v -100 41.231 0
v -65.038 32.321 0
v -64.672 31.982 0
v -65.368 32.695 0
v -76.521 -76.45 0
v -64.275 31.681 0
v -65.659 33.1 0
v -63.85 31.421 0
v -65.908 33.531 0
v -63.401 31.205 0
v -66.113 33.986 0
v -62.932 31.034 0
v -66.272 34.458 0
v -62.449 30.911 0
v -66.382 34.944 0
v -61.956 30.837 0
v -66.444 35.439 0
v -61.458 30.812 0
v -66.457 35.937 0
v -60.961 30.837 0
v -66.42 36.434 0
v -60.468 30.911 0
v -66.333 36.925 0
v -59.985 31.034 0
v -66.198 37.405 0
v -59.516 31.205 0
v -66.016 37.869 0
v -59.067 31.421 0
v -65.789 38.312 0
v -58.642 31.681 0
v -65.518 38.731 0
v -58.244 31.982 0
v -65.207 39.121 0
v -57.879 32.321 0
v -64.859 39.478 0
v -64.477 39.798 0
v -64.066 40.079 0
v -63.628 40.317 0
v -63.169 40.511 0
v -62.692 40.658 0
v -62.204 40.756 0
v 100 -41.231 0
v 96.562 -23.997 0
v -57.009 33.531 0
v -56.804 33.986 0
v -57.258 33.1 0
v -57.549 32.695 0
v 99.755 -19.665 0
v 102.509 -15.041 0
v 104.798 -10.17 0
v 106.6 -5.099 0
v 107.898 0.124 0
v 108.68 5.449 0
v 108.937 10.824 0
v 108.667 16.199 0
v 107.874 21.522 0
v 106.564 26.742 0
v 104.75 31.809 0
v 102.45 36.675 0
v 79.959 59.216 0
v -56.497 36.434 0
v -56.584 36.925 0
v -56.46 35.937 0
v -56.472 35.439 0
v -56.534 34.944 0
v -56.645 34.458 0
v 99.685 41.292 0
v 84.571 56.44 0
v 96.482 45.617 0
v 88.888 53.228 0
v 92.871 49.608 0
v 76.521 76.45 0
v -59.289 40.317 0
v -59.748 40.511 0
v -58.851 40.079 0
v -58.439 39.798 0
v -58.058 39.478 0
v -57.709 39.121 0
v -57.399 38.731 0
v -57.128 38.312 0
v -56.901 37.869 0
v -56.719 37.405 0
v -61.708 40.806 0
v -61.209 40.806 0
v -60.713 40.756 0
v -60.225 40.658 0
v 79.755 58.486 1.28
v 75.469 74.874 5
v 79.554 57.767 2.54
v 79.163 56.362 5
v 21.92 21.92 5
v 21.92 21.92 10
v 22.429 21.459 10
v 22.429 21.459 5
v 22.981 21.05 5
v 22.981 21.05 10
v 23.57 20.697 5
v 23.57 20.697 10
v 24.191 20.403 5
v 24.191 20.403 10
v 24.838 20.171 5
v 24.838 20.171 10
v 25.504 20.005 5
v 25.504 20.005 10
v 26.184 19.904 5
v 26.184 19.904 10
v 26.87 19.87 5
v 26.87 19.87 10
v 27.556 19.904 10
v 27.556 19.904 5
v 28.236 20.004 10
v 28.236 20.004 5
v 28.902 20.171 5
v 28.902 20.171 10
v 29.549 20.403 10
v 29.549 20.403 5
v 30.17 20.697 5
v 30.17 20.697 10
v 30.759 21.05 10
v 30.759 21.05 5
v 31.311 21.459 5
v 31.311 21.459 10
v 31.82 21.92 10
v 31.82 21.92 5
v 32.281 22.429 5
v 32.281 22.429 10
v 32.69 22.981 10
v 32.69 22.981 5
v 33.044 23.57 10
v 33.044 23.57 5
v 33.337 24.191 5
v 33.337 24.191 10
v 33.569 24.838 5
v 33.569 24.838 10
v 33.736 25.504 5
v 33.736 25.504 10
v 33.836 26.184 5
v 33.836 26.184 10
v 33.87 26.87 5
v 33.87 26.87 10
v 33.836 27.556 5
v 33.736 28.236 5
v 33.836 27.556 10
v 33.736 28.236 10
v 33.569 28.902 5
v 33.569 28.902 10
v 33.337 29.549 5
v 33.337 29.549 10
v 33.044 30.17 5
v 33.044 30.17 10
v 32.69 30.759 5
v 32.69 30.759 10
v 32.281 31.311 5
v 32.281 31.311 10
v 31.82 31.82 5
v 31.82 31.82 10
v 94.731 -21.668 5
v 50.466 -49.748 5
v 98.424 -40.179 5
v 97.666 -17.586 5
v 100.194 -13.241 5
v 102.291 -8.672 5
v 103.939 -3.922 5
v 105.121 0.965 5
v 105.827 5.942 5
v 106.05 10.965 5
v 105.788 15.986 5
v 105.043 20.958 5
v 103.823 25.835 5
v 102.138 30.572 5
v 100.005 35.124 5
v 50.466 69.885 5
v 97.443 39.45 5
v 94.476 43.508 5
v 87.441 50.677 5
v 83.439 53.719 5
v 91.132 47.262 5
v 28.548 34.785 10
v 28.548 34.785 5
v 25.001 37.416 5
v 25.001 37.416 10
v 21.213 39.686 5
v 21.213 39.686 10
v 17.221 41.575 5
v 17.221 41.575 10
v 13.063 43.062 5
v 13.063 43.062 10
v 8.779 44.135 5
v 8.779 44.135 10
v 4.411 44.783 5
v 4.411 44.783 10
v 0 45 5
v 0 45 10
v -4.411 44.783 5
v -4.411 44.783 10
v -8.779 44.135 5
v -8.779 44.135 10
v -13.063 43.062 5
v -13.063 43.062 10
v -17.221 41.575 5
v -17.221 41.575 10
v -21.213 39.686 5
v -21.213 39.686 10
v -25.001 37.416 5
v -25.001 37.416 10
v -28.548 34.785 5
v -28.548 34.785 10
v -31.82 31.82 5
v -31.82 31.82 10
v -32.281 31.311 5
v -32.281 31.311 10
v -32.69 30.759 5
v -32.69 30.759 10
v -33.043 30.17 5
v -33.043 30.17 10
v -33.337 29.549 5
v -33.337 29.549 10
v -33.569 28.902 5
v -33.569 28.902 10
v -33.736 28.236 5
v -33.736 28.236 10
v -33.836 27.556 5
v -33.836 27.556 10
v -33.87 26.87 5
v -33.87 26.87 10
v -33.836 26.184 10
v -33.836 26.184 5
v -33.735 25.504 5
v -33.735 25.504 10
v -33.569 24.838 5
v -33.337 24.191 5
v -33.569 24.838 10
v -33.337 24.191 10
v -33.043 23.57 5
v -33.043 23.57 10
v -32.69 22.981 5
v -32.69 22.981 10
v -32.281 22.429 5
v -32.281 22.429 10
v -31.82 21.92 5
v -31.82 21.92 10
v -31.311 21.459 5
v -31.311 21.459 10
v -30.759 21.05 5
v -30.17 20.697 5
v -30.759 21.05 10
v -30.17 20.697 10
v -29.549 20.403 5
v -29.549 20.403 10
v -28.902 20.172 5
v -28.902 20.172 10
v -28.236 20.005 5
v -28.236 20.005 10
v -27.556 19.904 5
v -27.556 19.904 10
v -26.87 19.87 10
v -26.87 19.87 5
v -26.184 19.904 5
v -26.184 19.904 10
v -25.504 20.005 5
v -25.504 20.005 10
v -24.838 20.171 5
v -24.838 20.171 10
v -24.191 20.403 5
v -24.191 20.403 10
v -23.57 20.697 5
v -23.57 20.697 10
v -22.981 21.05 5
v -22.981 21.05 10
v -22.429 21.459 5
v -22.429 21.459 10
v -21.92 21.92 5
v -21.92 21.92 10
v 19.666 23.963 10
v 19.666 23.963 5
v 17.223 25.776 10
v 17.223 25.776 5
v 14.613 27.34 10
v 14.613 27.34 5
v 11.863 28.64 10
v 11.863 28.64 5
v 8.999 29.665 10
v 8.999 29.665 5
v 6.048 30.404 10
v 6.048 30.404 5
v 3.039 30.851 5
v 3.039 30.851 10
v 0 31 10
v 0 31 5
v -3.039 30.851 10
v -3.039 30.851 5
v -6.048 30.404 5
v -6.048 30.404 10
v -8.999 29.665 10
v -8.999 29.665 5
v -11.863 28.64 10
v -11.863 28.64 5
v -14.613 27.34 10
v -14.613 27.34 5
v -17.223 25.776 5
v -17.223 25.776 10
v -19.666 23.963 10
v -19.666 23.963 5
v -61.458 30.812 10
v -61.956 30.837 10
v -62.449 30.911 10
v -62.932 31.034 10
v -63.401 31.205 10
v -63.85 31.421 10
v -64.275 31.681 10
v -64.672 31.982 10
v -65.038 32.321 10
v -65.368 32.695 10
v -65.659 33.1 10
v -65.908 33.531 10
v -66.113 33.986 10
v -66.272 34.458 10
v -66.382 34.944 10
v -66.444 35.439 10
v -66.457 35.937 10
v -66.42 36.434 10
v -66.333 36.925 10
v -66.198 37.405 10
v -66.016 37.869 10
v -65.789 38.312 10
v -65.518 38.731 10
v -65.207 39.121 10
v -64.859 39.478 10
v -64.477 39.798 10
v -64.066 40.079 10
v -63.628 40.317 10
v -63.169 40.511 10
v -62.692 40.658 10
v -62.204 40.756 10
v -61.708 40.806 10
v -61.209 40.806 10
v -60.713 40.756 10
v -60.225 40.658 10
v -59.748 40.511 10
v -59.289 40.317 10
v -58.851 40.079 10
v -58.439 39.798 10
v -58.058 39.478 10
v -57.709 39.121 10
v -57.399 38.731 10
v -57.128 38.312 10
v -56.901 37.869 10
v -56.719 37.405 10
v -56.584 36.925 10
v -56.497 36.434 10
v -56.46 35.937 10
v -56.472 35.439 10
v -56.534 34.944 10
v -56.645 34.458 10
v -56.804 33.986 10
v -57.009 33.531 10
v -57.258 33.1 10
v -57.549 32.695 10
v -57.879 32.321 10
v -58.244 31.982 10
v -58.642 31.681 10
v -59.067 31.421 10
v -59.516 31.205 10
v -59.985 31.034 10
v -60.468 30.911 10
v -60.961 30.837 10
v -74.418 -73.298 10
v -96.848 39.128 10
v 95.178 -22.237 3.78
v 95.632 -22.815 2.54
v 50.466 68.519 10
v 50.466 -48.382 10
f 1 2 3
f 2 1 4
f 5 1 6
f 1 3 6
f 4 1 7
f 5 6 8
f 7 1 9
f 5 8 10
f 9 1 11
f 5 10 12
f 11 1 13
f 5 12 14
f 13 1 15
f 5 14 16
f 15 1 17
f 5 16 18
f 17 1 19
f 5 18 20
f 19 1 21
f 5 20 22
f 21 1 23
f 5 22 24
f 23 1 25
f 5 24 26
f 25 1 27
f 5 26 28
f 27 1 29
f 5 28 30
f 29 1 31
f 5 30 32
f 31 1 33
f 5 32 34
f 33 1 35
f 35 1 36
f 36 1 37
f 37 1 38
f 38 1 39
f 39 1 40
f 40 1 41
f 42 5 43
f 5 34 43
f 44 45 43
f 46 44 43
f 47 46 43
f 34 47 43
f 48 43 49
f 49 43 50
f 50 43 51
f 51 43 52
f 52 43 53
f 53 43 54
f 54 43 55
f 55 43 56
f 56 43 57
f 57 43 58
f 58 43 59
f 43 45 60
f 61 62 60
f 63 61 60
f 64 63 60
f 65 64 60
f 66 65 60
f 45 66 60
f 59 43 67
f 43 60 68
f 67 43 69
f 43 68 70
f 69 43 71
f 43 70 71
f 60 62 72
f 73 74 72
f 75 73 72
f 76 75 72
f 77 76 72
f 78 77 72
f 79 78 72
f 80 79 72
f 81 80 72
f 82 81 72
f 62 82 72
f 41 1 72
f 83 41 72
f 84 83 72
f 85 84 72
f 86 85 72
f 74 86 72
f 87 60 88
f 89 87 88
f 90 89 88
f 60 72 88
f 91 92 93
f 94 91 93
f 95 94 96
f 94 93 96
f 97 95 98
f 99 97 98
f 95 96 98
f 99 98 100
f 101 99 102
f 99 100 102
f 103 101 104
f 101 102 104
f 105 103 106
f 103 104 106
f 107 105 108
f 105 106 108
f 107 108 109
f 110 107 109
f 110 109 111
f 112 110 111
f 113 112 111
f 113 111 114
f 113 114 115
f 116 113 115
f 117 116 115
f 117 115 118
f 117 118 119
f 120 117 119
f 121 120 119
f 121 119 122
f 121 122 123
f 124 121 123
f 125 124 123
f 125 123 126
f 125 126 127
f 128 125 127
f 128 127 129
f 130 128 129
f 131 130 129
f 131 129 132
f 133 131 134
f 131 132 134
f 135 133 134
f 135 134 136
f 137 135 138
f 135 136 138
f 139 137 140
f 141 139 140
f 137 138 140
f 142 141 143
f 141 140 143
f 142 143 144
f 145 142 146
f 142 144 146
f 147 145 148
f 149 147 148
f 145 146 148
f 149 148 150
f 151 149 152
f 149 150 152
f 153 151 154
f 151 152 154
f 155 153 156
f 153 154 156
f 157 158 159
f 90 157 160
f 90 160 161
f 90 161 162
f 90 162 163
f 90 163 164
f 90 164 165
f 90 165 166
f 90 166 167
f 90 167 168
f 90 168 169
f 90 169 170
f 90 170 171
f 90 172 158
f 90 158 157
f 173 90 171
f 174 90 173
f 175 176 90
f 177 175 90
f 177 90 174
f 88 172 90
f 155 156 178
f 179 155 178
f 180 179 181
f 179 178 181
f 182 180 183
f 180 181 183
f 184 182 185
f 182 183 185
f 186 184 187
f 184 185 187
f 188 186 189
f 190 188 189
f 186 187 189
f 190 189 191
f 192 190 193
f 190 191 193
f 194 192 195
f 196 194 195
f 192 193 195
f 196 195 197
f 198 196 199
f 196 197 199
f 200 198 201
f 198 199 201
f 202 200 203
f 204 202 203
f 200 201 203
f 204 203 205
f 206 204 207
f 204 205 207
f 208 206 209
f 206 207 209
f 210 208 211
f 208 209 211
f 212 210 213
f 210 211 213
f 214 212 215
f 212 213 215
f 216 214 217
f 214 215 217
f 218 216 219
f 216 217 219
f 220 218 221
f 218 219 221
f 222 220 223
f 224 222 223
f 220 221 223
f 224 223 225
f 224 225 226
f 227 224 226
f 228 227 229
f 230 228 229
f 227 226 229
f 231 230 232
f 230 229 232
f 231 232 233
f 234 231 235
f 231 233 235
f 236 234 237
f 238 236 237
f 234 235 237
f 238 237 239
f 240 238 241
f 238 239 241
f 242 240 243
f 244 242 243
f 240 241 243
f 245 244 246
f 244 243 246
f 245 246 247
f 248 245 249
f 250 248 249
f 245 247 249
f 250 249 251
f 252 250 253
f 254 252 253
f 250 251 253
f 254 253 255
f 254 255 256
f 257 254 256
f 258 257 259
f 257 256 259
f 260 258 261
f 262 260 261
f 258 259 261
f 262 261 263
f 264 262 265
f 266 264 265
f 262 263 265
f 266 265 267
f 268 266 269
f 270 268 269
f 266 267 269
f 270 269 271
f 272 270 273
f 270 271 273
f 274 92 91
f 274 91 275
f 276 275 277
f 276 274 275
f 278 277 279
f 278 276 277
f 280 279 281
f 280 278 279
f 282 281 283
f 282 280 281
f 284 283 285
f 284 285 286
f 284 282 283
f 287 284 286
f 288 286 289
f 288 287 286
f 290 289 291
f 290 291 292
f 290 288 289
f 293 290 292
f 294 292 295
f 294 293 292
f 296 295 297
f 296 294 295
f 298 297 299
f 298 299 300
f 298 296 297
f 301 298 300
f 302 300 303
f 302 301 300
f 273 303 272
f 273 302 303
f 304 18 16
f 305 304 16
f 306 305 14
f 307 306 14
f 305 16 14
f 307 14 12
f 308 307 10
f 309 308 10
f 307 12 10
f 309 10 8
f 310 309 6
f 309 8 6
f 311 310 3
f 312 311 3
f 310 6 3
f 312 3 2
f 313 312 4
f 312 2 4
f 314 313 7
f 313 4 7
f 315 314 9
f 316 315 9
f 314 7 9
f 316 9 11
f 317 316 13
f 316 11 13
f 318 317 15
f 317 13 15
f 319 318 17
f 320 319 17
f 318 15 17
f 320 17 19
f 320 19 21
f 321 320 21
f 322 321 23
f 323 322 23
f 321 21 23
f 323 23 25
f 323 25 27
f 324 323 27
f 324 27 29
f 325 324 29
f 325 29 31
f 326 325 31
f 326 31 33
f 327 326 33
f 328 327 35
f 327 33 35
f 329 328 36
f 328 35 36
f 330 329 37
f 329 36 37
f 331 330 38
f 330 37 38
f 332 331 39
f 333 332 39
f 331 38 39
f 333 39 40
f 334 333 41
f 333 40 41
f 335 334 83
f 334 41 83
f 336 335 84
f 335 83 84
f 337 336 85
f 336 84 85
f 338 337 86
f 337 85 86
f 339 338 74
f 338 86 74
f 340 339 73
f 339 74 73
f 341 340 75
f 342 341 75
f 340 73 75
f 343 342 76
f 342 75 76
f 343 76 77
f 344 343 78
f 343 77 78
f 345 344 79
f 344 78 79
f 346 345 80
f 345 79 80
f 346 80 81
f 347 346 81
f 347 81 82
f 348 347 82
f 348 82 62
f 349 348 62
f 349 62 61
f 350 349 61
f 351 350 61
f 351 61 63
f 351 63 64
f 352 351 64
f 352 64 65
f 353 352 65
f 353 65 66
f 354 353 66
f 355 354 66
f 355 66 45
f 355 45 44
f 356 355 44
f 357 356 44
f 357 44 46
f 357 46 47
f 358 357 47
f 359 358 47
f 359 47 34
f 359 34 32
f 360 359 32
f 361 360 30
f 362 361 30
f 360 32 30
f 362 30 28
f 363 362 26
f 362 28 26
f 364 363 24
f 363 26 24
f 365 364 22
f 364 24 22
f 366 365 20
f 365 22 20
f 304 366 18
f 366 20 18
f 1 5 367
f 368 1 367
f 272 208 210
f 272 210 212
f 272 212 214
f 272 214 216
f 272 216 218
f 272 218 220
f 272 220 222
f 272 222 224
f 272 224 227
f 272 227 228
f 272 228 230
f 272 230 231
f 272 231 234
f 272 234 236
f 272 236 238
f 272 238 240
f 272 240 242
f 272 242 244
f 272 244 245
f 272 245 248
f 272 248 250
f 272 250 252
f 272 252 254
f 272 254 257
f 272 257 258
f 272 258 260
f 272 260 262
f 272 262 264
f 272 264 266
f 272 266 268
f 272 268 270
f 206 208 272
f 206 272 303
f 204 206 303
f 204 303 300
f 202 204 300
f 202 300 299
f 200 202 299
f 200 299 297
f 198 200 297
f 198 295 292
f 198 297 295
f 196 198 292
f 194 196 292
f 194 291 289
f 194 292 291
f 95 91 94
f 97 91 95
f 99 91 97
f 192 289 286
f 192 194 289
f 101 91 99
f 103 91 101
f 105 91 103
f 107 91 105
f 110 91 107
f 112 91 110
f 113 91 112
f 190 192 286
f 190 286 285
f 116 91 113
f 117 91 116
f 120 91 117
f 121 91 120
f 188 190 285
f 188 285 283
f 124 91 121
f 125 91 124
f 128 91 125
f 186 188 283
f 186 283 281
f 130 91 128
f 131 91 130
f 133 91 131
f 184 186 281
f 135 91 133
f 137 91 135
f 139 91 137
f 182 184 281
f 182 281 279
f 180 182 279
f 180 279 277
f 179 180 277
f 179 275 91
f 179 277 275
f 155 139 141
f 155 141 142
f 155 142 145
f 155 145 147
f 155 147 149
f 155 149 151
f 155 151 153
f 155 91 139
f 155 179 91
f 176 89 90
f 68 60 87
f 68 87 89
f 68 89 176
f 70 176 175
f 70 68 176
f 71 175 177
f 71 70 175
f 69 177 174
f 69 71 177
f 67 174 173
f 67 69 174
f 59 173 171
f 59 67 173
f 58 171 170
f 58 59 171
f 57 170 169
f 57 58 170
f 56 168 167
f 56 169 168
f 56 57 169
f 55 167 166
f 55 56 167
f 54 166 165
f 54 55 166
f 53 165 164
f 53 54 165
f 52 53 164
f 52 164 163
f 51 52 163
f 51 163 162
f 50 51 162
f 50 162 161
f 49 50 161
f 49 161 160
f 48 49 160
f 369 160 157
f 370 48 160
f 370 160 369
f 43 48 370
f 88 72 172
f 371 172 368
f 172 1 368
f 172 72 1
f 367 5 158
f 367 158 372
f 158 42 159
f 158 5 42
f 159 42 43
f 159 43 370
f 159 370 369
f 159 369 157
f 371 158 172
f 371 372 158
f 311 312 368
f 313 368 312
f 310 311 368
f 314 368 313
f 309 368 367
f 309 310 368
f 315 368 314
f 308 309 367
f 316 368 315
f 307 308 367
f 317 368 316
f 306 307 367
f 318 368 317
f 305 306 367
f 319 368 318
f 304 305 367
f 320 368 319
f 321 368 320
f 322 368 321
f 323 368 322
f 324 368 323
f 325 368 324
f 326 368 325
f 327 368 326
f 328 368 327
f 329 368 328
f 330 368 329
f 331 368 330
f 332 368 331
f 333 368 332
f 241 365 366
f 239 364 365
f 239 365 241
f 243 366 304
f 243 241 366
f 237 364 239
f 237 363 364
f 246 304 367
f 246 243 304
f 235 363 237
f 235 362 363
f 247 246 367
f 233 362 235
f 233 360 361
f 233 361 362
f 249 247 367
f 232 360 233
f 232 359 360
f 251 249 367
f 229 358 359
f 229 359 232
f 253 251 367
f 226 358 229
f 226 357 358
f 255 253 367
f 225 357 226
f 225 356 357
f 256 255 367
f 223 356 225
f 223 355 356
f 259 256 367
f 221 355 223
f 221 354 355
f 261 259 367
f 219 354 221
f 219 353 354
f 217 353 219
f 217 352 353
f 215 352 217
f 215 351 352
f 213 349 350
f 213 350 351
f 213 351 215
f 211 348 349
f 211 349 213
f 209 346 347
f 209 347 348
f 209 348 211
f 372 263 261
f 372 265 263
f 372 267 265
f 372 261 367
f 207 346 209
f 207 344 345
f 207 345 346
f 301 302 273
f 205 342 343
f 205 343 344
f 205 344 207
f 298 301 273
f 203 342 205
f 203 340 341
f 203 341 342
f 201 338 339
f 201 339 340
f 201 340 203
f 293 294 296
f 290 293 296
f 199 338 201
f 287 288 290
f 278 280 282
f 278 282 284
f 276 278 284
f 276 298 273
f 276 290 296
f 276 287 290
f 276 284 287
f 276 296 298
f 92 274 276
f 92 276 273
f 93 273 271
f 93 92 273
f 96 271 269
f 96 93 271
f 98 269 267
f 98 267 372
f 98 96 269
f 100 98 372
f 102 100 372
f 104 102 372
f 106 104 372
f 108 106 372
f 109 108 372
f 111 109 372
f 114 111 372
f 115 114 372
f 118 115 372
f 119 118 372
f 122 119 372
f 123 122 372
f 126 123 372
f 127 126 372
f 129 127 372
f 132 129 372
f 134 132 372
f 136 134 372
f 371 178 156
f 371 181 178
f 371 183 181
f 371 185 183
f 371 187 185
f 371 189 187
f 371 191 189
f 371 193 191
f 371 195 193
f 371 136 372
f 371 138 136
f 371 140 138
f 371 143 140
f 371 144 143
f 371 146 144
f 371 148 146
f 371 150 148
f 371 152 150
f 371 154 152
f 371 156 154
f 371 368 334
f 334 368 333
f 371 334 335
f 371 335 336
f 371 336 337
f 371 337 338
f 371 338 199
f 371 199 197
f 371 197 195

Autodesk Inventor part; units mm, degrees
ref_plane "YZ Plane" through (0, 0, 0) normal (1, 0, 0) x (0, 1, 0)
ref_plane "XZ Plane" through (0, 0, 0) normal (0, 1, 0) x (-1, 0, 0)
ref_plane "XY Plane" through (0, 0, 0) normal (0, 0, 1) x (1, 0, 0)
sketch "Sketch1" plane through (0, 0, 0) normal (0, 0, 1) x (1, 0, 0)
  line L0 (-76.521, -76.4496) -> (100, -41.2311)
  line L1 (100, -41.2311) -> (76.521, 76.4496)
  line L2 (76.521, 76.4496) -> (-100, 41.2311)
  line L3 (-100, 41.2311) -> (-76.521, -76.4496)
  line L4 (-76.521, -76.4496) -> (76.521, 76.4496) construction
  line L5 (100, -41.2311) -> (-100, 41.2311) construction
  point P0 (0, 0)
  point P1 (0, 0)
  dimension "d0" = 180
  dimension "d1" = 120
  dimension "d23" = 100
extrude "Extrusion1" add sketch "Sketch1" along normal blind 10 draft -15
sketch "Sketch2" plane through (0, 0, 0) normal (0, 0, 1) x (1, 0, 0)
  circle A0 centre (53.937, 10.7612) radius 55
  line L0 (100, -41.2311) -> (76.521, 76.4496) construction
  line L1 (0, 0) -> (88.2605, 17.6093) construction
  dimension "d1" = 120
  dimension "d4" = 110
  dimension "d5" = 55
extrude "Extrusion2" add sketch "Sketch2" along normal blind 10 draft -30
sketch "Sketch3" plane through (0, 0, 10) normal (0, 0, 1) x (1, 0, 0)
  line L0 (-74.4175, -73.2976) -> (-96.848, 39.1276) projected
  line L1 (-96.848, 39.1276) -> (74.4175, 73.2976) projected
  point P0 (0, 0)
  point P1 (-61.4584, 35.8123)
hole "Hole1" at (-61.4584, 35.8123, 10) direction (0, 0, -1) diameter 10 depth 18
sketch "Sketch4" plane through (0, 0, 10) normal (0, 0, 1) x (1, 0, 0)
  arc A0 (26.8701, 26.8701) -> (-26.8701, 26.8701) centre (0, 0) ccw construction
  arc A1 (31.8198, 31.8198) -> (-31.8198, 31.8198) centre (0, 0) ccw
  arc A2 (21.9203, 21.9203) -> (-21.9203, 21.9203) centre (0, 0) ccw
  arc A3 (21.9203, 21.9203) -> (31.8198, 31.8198) centre (26.8701, 26.8701) ccw
  arc A4 (-31.8198, 31.8198) -> (-21.9203, 21.9203) centre (-26.8701, 26.8701) ccw
  dimension "d18" = 90
  dimension "d19" = 7
  dimension "d20" = 38
extrude "Extrusion3" cut sketch "Sketch4" against normal blind 5
sketch "Sketch6" plane through (0, 0, 10) normal (0, 0, 1) x (1, 0, 0)
  line L0 (50.4655, 83.5966) -> (130.9866, 83.5966)
  line L1 (130.9866, 83.5966) -> (130.9866, -61.5092)
  line L2 (130.9866, -61.5092) -> (50.4655, -61.5092)
  line L3 (50.4655, -61.5092) -> (50.4655, 83.5966)
  point P0 (0, 0)
  dimension "d1" = 120
extrude "Extrusion4" cut sketch "Sketch6" against normal up to surface (5 mm away)
properties part number "Deo1 with Sketch"
